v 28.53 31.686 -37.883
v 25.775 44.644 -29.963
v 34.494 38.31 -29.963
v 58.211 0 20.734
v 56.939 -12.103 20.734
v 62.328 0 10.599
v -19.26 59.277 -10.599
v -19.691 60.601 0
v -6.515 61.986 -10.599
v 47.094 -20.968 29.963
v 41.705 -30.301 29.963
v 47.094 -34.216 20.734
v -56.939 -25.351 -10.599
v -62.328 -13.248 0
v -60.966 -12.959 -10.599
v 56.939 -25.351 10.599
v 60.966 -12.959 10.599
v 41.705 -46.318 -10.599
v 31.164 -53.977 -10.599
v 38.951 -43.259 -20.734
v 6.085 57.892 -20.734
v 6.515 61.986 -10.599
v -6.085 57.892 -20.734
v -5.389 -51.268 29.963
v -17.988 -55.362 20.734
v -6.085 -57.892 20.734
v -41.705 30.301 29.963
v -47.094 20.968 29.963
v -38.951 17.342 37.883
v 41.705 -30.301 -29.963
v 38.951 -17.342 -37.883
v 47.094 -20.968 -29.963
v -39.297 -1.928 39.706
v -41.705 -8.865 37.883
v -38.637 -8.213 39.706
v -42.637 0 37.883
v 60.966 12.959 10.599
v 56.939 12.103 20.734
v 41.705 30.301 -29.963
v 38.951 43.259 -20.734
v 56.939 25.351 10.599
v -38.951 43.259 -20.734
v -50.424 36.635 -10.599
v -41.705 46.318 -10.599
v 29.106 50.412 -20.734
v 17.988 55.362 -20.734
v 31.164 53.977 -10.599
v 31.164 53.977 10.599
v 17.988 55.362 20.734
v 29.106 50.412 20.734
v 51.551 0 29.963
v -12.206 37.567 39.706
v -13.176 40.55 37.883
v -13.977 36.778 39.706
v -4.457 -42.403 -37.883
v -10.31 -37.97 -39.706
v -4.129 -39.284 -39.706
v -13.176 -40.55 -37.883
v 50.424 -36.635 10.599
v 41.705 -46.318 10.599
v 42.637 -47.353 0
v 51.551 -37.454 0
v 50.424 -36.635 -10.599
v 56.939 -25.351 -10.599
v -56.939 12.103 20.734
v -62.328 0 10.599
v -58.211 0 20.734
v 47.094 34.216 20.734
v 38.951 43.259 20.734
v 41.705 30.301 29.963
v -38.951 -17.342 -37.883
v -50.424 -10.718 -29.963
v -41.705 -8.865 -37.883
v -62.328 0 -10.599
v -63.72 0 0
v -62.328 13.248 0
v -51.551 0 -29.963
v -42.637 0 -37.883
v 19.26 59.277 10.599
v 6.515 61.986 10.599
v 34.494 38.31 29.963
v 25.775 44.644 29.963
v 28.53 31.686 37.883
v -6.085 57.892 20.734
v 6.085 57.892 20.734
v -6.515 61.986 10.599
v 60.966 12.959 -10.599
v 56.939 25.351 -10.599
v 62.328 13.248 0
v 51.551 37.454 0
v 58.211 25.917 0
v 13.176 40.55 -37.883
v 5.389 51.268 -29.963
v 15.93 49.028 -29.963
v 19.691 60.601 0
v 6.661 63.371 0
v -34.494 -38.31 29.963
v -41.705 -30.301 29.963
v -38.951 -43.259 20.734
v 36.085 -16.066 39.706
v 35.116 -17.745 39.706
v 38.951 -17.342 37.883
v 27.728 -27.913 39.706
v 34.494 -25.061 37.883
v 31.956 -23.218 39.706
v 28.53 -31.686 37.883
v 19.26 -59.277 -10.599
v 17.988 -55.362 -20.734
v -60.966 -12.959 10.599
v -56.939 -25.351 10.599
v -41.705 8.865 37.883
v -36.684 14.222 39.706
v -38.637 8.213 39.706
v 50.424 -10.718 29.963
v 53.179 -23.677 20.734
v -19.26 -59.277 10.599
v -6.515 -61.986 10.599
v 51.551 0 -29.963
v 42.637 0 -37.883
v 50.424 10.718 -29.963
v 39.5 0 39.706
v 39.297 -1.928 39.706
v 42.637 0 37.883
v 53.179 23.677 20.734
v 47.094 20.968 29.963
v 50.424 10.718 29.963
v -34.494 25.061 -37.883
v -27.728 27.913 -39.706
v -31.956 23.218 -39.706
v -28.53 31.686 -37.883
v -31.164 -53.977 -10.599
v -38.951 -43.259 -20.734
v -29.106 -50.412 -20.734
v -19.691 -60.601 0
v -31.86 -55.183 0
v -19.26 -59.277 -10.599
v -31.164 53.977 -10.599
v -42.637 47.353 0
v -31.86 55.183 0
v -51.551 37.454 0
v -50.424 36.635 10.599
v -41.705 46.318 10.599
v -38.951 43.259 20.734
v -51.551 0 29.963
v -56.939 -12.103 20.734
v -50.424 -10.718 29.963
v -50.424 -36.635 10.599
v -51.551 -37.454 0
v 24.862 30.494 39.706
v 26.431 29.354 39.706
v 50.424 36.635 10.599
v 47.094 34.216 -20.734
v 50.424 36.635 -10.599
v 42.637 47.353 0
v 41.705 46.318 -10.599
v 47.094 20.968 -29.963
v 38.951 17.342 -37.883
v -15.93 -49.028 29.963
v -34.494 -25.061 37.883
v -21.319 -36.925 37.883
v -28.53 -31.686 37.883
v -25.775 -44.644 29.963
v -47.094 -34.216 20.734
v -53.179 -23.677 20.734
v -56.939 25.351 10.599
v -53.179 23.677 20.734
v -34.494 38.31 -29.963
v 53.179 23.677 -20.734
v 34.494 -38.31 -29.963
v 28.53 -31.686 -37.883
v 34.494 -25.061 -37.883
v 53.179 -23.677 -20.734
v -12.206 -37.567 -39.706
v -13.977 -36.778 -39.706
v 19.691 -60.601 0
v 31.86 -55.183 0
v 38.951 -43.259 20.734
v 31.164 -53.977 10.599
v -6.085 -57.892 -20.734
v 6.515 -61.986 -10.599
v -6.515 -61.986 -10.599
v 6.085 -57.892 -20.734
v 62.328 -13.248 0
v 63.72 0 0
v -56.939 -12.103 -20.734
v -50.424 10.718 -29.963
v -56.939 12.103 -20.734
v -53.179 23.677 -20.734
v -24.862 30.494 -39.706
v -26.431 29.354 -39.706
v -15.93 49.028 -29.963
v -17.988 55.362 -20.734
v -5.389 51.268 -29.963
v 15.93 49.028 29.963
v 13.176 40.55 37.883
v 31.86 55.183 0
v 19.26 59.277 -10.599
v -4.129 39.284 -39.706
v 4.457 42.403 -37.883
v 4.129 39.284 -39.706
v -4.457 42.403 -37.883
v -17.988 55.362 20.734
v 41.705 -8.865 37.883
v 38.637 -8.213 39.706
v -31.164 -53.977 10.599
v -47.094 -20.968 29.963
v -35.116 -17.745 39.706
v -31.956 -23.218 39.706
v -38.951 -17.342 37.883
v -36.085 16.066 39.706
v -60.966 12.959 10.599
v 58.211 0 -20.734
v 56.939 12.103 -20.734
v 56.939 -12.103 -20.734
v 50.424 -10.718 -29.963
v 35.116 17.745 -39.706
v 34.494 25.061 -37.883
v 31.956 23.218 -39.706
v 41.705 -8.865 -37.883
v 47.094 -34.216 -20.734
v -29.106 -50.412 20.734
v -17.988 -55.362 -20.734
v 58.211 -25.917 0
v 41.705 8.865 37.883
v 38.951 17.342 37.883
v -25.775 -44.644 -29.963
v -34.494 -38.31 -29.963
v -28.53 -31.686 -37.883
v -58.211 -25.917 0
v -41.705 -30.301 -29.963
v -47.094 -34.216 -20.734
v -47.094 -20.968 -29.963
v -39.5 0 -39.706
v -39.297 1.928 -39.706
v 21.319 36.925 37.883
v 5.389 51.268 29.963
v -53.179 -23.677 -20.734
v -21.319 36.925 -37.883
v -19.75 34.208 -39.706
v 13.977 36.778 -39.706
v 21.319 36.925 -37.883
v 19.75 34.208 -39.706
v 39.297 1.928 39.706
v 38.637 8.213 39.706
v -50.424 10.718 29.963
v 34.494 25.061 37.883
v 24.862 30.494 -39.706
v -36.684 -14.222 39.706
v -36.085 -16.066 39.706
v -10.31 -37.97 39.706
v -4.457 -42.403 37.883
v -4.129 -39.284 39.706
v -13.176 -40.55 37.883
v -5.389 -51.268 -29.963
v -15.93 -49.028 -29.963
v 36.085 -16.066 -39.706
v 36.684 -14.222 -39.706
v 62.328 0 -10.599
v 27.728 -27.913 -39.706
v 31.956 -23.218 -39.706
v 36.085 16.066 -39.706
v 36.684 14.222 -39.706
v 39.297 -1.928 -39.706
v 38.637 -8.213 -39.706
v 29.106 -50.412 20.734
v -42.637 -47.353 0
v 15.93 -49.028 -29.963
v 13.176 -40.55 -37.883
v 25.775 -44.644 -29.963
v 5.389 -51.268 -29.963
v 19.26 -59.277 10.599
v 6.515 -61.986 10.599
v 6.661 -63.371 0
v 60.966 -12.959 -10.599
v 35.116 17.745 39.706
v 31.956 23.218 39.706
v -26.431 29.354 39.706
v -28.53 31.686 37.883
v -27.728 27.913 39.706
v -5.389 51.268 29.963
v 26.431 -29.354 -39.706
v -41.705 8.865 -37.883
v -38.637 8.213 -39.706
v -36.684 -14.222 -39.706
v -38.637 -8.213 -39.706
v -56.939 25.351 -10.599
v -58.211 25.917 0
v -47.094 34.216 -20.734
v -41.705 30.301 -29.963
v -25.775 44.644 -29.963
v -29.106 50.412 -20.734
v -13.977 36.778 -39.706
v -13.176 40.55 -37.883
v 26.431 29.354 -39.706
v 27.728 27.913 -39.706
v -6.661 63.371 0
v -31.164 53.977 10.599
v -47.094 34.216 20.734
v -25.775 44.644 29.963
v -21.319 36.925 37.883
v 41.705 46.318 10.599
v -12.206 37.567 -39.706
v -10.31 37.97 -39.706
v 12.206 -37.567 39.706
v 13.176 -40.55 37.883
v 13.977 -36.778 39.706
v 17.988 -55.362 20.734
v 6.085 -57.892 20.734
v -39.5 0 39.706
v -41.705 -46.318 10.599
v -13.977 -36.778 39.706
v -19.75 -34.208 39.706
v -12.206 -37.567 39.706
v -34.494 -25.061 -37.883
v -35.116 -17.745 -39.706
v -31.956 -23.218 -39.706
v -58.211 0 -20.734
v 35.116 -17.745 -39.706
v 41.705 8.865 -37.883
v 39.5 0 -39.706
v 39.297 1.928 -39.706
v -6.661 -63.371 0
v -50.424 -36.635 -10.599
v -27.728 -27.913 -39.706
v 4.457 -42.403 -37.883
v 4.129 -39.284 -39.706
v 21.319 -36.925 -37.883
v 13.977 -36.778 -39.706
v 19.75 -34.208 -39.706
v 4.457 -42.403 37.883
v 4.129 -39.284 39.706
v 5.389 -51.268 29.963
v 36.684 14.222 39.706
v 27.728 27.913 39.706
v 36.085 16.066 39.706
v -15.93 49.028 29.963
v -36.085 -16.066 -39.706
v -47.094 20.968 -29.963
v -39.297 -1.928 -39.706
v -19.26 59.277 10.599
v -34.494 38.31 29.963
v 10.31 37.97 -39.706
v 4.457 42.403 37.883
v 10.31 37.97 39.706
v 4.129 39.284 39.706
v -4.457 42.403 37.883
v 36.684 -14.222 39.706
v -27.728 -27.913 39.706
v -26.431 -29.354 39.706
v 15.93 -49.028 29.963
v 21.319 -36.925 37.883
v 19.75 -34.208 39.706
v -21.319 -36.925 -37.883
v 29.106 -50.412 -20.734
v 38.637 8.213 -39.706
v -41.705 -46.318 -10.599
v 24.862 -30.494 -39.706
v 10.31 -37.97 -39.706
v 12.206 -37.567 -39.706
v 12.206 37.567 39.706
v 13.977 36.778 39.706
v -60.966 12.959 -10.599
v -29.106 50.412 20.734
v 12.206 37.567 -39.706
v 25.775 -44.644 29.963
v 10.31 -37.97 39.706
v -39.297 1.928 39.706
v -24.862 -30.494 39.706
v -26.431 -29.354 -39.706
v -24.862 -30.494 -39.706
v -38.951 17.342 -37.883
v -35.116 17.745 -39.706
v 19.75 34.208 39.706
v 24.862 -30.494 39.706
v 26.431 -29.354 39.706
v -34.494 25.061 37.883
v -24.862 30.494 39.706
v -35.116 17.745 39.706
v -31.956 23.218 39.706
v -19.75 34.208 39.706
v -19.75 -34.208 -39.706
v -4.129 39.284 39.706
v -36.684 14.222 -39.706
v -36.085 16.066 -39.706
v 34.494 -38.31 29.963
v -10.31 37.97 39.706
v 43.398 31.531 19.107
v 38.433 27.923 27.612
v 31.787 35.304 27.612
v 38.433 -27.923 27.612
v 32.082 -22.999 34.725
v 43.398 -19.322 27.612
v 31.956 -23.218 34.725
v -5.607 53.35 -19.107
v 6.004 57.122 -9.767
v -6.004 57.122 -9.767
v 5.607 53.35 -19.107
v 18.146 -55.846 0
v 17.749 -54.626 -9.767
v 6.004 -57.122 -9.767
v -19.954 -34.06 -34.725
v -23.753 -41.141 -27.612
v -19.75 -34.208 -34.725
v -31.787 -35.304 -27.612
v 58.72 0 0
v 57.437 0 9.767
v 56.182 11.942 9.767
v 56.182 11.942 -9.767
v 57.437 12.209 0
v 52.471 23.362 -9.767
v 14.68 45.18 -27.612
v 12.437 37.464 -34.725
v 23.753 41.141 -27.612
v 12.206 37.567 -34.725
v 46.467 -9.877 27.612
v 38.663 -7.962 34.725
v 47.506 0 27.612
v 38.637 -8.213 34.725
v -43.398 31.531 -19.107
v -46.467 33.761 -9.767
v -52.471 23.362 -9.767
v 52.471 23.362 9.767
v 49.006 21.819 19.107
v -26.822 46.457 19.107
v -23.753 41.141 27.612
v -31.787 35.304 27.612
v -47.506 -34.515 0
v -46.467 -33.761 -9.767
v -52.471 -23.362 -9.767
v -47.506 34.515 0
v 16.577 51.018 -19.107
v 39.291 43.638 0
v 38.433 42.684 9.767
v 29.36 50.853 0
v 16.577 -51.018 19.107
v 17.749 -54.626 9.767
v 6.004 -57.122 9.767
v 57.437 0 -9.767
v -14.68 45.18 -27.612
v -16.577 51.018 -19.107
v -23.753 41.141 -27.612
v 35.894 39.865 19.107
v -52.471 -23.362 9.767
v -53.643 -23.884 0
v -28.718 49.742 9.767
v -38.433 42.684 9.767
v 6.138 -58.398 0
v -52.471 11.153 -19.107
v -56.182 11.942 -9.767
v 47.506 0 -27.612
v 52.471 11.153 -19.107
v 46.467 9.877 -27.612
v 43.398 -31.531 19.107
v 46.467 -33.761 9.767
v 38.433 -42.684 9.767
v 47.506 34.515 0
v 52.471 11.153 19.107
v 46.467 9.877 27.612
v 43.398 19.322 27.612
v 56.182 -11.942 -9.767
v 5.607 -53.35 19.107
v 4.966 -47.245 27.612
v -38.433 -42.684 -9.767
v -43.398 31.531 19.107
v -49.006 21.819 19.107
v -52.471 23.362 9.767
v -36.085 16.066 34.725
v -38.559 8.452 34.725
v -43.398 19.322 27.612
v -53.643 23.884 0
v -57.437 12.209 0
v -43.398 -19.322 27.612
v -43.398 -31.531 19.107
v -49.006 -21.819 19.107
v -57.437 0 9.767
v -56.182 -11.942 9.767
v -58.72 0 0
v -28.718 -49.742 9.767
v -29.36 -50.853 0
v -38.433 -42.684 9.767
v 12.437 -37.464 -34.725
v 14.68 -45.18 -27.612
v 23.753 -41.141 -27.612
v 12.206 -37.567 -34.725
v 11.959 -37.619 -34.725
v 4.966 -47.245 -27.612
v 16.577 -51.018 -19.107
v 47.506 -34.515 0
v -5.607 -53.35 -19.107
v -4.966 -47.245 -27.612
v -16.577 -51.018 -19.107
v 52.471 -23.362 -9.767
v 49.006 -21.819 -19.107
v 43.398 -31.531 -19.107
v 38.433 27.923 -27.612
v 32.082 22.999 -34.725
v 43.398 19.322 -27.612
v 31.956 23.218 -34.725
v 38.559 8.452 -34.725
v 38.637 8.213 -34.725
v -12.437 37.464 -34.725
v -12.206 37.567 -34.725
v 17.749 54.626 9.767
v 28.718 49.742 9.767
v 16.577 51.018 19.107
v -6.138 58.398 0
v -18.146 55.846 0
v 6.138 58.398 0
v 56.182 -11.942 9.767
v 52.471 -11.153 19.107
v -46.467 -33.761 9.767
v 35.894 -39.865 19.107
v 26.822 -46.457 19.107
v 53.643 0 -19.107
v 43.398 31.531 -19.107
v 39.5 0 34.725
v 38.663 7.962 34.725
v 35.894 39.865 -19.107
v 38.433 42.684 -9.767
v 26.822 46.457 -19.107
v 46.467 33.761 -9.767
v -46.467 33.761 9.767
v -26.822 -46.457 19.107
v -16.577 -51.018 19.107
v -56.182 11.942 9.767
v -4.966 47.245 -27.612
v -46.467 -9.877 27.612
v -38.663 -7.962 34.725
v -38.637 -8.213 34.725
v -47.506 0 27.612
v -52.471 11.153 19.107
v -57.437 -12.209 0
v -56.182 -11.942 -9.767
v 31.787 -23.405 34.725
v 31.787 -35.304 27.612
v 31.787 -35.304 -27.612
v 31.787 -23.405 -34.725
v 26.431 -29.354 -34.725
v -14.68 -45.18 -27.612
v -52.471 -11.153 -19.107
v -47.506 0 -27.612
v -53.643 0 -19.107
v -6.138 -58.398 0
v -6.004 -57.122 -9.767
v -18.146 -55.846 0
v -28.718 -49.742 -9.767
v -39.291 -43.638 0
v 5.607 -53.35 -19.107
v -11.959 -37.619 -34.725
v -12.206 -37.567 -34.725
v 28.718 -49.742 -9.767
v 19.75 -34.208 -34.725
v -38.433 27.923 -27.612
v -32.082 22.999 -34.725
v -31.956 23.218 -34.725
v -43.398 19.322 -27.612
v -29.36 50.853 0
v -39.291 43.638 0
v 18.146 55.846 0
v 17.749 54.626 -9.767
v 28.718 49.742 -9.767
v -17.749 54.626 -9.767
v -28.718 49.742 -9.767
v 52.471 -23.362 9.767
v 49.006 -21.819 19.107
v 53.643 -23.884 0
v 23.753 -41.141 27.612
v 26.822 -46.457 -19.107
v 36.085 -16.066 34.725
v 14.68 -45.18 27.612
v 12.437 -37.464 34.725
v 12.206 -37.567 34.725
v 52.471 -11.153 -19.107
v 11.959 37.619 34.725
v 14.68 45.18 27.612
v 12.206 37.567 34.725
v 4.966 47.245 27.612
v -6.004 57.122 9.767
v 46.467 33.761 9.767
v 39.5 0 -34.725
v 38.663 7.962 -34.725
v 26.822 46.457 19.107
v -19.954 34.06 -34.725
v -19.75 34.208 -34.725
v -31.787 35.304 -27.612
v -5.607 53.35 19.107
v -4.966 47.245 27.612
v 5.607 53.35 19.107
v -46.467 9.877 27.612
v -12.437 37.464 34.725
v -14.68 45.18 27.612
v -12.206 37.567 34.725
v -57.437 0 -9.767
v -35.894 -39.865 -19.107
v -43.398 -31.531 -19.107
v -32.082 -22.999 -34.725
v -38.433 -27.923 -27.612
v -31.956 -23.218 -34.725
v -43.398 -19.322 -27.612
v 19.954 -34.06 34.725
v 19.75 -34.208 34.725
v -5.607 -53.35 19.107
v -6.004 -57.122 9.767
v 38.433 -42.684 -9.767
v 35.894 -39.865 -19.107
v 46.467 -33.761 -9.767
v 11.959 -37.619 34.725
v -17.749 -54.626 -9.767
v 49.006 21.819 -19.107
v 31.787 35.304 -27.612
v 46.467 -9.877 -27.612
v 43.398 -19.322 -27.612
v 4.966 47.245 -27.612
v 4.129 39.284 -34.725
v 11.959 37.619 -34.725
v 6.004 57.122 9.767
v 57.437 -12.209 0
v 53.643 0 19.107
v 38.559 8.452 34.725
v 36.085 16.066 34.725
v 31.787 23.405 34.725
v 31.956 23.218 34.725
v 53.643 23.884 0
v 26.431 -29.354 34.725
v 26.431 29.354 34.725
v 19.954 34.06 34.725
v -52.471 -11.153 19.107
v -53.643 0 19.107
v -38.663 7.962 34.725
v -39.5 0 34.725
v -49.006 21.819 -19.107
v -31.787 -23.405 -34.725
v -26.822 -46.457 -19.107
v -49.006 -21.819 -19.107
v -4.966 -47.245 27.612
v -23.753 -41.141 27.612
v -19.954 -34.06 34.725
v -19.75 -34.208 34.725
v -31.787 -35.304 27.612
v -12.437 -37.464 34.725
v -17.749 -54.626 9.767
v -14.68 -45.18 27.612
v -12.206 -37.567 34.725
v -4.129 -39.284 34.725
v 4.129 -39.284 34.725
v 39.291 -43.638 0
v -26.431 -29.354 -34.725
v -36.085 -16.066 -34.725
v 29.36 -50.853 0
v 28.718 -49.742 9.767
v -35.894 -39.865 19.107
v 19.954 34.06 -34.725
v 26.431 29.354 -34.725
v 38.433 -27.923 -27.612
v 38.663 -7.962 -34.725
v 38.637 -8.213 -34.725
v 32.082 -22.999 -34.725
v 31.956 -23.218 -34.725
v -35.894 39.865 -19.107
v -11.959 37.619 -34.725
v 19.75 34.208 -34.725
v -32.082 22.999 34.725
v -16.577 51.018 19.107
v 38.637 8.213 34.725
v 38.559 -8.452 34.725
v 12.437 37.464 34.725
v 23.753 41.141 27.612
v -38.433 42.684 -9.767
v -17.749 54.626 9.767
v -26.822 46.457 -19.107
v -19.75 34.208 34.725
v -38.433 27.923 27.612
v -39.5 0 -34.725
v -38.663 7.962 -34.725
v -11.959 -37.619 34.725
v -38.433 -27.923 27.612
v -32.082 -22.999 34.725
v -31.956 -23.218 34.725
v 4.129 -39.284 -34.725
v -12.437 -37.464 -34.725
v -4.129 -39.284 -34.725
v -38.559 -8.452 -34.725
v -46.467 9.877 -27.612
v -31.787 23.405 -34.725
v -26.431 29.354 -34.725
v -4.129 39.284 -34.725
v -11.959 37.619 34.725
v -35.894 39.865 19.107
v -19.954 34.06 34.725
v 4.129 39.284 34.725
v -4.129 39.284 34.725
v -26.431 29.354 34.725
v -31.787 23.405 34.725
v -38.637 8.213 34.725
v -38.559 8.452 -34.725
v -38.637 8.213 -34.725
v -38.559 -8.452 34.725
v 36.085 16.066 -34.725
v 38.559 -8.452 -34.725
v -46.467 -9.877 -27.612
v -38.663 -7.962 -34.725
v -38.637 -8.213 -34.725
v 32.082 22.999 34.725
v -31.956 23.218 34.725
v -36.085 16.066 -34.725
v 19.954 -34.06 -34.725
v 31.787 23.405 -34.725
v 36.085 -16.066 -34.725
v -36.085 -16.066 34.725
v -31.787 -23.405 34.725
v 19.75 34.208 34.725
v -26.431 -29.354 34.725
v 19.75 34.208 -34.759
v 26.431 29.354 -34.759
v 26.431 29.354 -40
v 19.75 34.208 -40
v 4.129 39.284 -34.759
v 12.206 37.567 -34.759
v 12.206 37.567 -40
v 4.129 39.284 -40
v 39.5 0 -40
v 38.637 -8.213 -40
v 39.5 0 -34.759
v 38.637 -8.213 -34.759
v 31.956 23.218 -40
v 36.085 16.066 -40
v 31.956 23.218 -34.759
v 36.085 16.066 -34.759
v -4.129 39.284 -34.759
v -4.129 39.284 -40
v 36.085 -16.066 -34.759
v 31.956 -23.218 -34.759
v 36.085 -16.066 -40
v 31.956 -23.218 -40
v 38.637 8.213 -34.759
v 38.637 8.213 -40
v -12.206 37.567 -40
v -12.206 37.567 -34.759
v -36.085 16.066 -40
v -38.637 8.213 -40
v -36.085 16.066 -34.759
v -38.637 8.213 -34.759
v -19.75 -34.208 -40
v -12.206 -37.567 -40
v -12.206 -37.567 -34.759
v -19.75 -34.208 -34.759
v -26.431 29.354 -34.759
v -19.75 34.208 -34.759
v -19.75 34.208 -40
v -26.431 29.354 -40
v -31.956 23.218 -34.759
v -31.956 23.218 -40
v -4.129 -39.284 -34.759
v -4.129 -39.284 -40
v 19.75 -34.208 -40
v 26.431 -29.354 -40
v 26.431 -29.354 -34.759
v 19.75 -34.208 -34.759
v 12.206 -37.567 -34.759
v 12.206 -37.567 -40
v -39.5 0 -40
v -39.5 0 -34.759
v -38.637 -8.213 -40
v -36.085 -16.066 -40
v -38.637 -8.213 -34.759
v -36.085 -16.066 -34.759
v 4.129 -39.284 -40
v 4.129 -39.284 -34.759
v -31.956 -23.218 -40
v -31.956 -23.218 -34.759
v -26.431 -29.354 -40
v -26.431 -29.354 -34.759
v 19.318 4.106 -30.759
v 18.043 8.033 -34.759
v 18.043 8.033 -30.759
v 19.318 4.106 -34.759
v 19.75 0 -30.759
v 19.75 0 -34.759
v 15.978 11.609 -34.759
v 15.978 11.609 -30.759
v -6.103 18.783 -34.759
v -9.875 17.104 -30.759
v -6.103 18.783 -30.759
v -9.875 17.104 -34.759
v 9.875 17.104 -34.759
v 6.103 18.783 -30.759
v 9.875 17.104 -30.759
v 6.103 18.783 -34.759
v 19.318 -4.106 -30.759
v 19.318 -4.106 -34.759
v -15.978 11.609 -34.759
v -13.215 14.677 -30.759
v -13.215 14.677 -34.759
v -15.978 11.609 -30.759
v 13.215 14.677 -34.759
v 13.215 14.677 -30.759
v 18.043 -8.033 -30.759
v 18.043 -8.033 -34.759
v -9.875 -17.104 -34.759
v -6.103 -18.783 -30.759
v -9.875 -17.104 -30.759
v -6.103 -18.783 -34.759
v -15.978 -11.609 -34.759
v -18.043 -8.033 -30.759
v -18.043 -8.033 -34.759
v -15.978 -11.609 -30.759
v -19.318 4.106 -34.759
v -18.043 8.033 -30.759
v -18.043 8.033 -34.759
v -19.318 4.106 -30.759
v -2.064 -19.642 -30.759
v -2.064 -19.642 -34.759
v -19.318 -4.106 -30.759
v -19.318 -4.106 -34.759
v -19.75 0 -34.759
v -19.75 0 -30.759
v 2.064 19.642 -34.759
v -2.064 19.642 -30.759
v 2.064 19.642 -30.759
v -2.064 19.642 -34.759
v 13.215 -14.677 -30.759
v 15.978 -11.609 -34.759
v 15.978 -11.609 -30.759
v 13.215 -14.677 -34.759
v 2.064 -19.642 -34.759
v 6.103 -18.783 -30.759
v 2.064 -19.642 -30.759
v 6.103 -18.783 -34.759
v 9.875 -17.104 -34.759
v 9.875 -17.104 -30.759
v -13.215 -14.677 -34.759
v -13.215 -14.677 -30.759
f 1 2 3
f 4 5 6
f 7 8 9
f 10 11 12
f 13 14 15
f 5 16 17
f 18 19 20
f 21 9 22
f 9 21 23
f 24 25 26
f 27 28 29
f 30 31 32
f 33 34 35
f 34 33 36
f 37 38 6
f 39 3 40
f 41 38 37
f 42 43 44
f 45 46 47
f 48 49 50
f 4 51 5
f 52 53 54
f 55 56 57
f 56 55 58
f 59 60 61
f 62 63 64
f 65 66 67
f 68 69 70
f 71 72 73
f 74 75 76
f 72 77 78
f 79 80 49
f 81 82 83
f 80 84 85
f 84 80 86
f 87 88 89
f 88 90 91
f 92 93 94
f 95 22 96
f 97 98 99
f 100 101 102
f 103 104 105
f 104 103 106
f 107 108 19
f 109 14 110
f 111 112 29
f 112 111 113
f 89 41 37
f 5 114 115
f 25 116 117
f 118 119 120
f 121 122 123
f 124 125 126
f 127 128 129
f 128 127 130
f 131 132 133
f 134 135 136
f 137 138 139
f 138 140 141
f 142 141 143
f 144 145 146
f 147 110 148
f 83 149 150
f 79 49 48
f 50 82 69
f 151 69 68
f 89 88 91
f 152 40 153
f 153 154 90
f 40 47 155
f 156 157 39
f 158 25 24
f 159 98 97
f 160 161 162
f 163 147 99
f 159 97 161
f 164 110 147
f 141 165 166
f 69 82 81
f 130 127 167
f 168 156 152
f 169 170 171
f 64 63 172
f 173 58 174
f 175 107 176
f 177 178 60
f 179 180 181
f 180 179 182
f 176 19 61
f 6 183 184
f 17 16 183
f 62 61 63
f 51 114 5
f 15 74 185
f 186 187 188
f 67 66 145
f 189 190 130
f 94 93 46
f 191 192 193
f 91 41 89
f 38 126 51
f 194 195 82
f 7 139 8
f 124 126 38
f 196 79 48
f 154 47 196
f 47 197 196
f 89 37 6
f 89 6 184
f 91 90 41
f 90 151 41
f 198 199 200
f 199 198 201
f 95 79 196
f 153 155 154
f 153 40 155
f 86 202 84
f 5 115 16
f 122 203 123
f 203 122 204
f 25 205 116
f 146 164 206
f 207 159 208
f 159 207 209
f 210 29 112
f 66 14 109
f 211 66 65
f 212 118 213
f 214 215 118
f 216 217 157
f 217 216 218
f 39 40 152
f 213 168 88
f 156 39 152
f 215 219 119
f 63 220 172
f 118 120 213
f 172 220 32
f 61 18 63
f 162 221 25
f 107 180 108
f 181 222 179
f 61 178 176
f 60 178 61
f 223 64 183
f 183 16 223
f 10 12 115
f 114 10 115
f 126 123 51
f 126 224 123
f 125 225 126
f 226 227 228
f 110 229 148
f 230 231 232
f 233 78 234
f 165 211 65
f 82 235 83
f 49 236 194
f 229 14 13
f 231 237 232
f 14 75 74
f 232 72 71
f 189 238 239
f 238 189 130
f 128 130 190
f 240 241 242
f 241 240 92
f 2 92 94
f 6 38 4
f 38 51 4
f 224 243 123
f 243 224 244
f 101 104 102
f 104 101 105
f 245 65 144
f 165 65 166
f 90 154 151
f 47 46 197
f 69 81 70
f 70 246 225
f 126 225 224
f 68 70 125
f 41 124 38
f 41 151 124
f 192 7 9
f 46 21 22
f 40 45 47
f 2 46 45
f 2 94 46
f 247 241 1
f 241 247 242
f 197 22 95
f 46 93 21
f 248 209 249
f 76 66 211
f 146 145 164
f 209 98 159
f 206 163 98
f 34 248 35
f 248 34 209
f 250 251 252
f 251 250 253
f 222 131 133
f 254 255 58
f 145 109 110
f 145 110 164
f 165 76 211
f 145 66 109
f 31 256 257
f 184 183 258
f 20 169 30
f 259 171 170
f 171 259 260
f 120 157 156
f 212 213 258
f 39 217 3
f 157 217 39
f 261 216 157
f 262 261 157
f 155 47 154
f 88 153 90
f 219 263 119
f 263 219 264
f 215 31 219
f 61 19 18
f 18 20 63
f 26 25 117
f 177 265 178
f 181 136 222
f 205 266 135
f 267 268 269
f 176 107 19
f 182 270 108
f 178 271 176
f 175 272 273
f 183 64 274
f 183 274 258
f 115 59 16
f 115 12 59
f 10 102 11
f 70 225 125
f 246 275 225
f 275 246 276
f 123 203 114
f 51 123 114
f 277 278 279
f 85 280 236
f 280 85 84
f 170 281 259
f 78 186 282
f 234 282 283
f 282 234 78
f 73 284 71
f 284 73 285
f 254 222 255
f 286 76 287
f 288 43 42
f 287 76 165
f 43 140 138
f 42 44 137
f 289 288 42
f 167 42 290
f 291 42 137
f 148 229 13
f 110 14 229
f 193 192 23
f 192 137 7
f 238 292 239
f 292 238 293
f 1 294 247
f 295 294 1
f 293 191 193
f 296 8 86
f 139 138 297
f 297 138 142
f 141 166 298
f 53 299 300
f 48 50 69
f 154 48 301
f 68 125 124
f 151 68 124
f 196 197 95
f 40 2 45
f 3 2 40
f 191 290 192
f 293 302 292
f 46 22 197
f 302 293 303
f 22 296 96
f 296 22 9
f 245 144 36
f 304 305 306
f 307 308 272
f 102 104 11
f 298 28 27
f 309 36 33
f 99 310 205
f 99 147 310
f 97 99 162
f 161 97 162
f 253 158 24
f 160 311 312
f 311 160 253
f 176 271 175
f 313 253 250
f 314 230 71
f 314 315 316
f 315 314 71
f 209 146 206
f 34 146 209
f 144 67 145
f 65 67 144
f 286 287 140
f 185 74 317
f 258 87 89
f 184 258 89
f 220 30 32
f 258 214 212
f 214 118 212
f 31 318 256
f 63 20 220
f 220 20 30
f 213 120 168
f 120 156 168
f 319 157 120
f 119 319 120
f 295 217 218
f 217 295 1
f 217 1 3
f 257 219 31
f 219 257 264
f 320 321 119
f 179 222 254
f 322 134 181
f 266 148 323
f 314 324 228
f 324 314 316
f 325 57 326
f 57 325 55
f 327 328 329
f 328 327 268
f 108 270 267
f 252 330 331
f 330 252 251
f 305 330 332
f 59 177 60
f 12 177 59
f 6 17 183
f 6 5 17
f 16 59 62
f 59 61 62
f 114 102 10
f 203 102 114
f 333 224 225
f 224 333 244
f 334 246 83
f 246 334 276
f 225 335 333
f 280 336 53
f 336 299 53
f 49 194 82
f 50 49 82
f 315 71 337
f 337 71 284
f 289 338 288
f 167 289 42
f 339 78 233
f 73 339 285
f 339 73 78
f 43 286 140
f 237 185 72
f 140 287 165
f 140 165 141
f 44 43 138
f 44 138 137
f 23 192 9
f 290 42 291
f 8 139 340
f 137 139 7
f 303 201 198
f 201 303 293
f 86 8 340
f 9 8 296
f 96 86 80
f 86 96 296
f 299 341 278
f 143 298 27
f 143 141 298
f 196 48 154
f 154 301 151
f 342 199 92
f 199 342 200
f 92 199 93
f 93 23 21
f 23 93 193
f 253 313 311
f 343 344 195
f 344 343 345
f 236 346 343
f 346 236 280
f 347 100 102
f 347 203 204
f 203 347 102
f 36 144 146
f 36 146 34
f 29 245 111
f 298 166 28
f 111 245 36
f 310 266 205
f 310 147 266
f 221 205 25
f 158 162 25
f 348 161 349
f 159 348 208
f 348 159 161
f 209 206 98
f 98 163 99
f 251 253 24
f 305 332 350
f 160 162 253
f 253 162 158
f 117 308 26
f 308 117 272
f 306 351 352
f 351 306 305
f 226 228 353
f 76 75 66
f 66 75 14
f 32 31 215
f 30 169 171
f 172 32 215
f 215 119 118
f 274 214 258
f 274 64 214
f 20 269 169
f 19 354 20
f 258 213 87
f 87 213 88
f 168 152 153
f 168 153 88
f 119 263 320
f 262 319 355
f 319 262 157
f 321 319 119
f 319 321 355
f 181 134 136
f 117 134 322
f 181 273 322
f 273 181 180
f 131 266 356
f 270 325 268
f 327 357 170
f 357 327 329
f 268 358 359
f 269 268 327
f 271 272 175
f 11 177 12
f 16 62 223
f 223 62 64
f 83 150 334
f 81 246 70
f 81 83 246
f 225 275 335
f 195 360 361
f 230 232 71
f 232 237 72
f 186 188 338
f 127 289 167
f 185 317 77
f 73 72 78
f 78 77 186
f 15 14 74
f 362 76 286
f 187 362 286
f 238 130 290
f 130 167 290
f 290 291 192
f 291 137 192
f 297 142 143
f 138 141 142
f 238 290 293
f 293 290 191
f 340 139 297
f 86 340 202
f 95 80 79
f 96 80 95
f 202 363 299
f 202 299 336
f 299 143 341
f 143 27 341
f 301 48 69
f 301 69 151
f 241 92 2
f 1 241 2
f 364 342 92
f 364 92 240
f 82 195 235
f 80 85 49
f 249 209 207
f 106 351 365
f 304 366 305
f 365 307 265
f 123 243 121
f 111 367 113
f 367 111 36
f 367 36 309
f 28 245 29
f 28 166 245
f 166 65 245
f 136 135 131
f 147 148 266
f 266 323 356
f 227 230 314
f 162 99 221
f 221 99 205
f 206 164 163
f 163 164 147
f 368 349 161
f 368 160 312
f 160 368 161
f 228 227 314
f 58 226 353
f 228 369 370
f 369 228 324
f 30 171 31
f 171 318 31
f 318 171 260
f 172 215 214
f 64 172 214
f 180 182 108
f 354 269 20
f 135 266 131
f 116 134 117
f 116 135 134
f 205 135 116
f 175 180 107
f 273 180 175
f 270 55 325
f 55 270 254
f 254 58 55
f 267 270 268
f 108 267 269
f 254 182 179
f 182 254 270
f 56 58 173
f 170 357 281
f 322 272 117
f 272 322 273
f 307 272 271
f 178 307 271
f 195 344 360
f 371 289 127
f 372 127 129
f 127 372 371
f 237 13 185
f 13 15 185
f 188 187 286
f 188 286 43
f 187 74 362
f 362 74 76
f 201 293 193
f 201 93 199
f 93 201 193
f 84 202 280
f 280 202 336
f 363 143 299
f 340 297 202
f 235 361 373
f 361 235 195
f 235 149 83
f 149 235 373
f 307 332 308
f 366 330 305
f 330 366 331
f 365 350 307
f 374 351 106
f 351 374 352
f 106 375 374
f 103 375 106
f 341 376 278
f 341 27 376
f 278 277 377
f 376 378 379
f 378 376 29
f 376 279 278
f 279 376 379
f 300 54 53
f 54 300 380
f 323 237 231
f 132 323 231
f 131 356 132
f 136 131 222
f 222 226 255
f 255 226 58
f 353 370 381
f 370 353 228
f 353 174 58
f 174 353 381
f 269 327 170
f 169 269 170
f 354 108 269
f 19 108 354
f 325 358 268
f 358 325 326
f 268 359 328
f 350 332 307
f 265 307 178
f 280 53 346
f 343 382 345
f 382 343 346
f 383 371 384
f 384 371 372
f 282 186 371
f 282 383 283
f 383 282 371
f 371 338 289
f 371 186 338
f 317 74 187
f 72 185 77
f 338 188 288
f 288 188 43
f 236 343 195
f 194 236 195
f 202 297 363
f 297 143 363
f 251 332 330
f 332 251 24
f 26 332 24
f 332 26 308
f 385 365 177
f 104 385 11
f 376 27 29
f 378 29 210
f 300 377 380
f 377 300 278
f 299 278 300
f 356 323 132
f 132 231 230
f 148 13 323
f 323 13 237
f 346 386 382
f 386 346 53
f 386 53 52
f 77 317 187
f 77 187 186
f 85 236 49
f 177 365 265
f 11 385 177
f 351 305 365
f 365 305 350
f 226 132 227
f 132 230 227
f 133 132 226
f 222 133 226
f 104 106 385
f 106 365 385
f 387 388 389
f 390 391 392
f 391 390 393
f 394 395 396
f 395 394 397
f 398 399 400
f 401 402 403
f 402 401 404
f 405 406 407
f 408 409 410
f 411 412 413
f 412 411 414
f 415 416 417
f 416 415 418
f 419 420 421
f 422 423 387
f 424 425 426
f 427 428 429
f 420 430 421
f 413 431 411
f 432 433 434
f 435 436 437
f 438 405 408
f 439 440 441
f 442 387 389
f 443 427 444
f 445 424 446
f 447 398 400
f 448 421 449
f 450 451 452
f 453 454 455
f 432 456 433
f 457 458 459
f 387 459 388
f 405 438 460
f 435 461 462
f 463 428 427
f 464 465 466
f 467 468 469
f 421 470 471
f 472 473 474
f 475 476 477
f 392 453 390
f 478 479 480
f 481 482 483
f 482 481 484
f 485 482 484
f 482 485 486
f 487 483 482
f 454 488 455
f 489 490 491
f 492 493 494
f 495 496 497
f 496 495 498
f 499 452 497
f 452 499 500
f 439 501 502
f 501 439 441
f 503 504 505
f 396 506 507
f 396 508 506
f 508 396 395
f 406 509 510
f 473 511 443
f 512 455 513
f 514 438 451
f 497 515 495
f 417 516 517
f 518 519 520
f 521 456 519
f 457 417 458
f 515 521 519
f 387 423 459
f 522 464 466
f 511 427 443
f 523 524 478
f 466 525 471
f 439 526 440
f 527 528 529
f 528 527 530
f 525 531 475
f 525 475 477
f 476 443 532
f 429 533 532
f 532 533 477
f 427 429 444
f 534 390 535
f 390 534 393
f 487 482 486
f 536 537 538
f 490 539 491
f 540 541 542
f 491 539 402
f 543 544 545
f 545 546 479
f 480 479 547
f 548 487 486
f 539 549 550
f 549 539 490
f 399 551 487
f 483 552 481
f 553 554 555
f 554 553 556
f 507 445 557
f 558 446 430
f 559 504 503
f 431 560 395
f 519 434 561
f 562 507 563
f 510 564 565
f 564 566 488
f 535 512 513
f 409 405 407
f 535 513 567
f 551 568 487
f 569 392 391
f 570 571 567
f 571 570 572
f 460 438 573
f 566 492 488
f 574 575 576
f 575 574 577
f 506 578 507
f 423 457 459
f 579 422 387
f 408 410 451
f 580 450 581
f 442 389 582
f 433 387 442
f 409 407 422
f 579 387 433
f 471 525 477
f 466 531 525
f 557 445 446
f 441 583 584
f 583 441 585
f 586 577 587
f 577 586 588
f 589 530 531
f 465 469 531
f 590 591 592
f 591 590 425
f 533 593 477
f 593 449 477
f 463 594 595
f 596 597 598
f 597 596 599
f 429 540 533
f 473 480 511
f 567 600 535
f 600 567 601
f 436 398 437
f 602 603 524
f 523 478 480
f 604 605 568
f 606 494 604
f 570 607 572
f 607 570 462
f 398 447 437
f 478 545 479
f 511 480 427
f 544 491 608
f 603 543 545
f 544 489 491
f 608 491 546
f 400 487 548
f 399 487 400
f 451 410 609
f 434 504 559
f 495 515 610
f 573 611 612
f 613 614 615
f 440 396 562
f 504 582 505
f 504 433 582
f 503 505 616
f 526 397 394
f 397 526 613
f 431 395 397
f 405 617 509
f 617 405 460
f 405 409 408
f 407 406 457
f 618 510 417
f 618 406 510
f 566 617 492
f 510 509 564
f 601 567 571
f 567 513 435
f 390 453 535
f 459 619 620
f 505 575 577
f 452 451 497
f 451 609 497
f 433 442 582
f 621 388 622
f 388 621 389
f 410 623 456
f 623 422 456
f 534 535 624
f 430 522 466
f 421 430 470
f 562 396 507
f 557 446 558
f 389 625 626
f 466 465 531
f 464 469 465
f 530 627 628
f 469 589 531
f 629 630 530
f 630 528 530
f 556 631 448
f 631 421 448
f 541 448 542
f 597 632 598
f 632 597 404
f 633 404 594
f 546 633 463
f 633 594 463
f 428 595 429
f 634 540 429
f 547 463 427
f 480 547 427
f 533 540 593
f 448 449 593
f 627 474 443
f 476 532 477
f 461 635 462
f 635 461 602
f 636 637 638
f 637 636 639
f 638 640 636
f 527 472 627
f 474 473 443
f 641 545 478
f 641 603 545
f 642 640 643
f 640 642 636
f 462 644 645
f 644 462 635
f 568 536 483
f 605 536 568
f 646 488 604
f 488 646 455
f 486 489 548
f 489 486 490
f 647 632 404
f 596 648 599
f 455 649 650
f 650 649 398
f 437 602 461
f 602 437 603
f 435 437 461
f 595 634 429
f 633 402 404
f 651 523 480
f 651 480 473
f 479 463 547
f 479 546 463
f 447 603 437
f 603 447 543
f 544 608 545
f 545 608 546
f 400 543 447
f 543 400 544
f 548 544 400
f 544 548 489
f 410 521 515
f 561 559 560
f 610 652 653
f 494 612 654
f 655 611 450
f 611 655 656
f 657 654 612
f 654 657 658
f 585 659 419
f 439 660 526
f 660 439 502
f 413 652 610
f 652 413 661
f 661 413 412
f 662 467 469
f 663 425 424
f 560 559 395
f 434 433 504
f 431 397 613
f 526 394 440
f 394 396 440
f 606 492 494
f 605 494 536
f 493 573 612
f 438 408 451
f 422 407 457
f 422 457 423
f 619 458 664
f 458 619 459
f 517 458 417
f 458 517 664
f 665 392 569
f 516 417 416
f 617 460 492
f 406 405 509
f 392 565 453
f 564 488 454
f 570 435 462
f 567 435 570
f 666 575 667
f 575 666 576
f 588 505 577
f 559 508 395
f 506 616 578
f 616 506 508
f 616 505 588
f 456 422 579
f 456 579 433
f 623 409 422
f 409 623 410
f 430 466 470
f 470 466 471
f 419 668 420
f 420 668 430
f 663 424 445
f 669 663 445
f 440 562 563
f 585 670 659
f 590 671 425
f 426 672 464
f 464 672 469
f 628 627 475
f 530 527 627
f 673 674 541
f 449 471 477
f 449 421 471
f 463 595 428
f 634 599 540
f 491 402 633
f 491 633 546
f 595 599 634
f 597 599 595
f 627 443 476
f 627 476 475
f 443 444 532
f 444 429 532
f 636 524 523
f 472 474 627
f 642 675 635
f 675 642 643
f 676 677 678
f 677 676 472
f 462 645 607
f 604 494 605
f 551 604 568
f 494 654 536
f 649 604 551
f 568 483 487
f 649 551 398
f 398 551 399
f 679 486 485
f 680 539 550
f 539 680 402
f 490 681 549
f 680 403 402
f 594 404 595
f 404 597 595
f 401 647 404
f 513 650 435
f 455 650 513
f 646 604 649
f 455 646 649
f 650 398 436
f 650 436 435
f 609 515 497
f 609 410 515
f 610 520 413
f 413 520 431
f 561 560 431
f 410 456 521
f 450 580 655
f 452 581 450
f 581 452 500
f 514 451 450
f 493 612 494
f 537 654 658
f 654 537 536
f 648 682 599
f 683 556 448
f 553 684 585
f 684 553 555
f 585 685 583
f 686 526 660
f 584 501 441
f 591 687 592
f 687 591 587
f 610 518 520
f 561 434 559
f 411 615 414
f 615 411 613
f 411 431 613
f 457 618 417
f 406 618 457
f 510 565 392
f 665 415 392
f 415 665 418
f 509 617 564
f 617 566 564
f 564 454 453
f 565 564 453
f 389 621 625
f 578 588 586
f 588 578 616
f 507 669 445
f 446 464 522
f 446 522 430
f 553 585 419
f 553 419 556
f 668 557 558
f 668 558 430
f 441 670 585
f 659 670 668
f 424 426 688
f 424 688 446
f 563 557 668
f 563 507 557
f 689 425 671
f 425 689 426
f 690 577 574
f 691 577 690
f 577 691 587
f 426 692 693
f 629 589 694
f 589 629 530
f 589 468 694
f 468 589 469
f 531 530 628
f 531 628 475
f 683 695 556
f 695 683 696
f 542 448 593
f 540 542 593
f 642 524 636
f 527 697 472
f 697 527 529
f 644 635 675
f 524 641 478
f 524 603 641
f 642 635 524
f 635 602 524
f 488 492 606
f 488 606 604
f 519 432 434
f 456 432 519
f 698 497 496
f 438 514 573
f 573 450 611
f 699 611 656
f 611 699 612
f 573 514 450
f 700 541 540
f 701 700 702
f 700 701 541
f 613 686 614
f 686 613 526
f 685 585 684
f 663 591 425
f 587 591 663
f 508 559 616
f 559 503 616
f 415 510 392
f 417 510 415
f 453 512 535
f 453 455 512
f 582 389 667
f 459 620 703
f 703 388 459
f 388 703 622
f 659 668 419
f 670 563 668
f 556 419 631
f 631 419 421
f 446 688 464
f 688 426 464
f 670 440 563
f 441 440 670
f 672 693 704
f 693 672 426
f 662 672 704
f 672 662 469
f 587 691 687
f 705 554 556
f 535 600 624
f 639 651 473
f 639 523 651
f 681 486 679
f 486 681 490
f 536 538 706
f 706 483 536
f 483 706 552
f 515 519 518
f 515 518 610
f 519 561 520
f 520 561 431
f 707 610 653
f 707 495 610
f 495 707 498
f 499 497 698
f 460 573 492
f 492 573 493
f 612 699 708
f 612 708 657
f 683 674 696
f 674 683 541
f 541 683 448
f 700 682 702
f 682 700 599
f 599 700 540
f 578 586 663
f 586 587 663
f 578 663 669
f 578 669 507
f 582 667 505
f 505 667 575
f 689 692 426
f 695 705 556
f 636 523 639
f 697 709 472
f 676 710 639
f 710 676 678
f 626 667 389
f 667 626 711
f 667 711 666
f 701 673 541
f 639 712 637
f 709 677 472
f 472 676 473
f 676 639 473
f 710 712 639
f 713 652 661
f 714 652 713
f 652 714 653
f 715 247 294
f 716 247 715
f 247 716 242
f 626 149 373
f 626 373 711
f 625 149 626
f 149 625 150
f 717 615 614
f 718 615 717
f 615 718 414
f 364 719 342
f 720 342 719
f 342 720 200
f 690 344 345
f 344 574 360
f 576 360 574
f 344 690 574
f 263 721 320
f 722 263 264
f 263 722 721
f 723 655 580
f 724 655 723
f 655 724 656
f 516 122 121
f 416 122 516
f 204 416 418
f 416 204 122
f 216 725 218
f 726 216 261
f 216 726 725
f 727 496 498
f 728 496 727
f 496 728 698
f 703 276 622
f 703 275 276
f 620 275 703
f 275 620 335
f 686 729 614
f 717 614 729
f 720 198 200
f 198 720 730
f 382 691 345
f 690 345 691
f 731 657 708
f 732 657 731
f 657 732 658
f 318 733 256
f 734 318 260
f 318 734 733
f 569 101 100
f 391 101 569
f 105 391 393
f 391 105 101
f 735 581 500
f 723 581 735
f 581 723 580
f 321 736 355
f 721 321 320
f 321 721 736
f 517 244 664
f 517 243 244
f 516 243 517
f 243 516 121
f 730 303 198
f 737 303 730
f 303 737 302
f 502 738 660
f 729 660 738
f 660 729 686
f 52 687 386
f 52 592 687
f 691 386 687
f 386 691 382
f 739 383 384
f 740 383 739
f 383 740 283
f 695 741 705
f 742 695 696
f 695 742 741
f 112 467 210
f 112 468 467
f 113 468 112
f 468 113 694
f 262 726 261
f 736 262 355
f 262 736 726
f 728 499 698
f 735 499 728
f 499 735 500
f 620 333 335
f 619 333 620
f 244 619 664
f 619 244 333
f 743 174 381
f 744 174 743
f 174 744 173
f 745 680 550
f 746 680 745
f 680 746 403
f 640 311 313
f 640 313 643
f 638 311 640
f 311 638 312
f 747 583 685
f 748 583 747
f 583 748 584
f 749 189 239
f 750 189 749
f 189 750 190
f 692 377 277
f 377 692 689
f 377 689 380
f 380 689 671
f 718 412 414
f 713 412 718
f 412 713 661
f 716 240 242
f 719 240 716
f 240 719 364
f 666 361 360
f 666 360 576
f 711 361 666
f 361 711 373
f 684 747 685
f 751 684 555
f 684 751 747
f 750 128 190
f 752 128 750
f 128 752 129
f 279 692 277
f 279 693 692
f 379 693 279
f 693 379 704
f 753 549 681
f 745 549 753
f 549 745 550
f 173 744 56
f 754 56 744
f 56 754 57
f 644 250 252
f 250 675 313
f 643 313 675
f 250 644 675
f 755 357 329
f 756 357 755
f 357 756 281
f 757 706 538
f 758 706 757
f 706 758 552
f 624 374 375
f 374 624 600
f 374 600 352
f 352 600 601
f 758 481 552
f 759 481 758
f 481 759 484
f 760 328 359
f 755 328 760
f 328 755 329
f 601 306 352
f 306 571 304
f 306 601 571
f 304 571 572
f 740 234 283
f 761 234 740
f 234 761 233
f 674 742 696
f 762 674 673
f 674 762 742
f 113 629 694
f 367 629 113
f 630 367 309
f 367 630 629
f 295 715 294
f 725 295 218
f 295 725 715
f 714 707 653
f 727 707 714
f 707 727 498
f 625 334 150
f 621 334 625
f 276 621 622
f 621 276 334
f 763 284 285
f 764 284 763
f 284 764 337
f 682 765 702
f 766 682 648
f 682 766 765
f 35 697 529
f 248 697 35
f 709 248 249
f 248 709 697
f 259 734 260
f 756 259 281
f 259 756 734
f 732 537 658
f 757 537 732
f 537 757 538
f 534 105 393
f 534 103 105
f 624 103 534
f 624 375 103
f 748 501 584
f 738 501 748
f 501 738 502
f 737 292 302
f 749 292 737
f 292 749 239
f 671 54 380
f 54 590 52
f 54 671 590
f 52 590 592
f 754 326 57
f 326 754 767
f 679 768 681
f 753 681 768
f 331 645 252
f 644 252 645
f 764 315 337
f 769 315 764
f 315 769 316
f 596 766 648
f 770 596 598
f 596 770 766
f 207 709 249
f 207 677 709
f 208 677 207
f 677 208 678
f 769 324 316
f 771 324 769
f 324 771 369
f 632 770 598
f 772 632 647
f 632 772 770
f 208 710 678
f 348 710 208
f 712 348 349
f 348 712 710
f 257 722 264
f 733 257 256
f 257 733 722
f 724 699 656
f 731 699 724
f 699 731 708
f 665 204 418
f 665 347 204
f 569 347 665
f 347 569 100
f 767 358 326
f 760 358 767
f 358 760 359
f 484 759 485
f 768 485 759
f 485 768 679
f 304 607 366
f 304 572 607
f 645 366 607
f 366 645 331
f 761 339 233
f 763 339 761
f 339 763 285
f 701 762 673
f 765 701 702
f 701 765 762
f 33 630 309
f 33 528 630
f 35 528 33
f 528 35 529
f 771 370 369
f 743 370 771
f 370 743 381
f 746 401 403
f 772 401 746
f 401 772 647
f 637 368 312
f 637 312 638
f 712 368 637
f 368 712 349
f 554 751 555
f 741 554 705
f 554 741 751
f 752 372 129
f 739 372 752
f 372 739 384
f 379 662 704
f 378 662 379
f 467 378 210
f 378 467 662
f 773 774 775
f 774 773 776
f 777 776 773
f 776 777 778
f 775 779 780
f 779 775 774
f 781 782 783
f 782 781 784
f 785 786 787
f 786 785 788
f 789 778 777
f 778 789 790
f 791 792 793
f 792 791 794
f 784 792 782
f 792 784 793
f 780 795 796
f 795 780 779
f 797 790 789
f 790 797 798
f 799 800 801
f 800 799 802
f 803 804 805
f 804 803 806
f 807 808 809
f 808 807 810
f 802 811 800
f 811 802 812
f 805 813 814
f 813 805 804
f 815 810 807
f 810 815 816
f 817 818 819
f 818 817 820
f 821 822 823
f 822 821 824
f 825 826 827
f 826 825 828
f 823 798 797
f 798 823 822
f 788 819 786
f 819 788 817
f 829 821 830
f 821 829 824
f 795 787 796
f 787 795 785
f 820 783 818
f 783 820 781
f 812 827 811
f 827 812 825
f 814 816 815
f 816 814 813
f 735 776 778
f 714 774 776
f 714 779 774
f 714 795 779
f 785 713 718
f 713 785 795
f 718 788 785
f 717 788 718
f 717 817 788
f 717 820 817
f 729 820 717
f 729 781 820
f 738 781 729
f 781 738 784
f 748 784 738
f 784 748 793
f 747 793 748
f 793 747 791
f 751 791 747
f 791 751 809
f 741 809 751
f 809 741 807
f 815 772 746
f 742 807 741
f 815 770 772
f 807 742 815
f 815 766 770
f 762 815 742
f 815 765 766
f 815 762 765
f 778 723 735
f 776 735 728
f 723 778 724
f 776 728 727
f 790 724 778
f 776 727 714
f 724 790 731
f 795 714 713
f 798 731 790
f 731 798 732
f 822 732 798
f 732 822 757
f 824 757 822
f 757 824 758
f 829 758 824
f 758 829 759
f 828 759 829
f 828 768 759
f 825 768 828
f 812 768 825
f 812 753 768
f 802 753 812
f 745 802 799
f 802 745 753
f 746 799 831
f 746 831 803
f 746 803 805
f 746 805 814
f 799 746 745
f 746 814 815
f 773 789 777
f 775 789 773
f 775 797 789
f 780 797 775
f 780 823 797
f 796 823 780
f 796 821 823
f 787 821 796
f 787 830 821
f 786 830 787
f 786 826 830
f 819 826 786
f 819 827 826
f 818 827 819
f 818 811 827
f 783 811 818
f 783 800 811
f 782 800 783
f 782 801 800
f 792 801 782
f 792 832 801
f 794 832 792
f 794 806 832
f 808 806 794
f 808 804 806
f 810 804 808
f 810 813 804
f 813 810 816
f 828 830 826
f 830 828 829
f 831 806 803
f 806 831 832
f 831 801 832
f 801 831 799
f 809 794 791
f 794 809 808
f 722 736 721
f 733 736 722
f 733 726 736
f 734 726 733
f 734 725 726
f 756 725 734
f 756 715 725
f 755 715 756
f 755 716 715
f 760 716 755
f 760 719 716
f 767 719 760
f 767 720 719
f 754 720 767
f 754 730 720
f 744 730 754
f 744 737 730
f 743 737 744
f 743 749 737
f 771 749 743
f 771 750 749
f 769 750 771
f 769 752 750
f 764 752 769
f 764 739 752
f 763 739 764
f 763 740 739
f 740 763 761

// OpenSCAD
/**
 * A water holder for can planter.
 *
 * All measurements are in millimeters.
 *
 * Parameters:
 *   - can_rad: Radius of the can.
 *   - thickness: Thickness of the holder.
 *   - height: Height of the holder.
 *   - vert_scale: Ratio between horizontal and vertical diameters.
 */

can_rad = (75 / 2) + 2;

thickness = 5;
height = 50;
vert_scale = 0.8;

outer_rad = sqrt(can_rad * can_rad + height * height);
inner_rad = outer_rad - thickness;

base_top = cos(asin(can_rad / inner_rad)) * inner_rad;
base_bot = cos(asin(can_rad / outer_rad)) * outer_rad;

scale([1, 1, vert_scale]) {
    union() {
        difference() {
            sphere(outer_rad);
            sphere(inner_rad);
            translate([0, 0, -outer_rad])
                cylinder(outer_rad * 2, r = can_rad);
        }
        translate([0, 0, -base_top])
            cylinder(thickness, r = can_rad / 2);
        translate([0, 0, -base_bot])
            cylinder(base_bot - base_top, r = can_rad);
    }
}
